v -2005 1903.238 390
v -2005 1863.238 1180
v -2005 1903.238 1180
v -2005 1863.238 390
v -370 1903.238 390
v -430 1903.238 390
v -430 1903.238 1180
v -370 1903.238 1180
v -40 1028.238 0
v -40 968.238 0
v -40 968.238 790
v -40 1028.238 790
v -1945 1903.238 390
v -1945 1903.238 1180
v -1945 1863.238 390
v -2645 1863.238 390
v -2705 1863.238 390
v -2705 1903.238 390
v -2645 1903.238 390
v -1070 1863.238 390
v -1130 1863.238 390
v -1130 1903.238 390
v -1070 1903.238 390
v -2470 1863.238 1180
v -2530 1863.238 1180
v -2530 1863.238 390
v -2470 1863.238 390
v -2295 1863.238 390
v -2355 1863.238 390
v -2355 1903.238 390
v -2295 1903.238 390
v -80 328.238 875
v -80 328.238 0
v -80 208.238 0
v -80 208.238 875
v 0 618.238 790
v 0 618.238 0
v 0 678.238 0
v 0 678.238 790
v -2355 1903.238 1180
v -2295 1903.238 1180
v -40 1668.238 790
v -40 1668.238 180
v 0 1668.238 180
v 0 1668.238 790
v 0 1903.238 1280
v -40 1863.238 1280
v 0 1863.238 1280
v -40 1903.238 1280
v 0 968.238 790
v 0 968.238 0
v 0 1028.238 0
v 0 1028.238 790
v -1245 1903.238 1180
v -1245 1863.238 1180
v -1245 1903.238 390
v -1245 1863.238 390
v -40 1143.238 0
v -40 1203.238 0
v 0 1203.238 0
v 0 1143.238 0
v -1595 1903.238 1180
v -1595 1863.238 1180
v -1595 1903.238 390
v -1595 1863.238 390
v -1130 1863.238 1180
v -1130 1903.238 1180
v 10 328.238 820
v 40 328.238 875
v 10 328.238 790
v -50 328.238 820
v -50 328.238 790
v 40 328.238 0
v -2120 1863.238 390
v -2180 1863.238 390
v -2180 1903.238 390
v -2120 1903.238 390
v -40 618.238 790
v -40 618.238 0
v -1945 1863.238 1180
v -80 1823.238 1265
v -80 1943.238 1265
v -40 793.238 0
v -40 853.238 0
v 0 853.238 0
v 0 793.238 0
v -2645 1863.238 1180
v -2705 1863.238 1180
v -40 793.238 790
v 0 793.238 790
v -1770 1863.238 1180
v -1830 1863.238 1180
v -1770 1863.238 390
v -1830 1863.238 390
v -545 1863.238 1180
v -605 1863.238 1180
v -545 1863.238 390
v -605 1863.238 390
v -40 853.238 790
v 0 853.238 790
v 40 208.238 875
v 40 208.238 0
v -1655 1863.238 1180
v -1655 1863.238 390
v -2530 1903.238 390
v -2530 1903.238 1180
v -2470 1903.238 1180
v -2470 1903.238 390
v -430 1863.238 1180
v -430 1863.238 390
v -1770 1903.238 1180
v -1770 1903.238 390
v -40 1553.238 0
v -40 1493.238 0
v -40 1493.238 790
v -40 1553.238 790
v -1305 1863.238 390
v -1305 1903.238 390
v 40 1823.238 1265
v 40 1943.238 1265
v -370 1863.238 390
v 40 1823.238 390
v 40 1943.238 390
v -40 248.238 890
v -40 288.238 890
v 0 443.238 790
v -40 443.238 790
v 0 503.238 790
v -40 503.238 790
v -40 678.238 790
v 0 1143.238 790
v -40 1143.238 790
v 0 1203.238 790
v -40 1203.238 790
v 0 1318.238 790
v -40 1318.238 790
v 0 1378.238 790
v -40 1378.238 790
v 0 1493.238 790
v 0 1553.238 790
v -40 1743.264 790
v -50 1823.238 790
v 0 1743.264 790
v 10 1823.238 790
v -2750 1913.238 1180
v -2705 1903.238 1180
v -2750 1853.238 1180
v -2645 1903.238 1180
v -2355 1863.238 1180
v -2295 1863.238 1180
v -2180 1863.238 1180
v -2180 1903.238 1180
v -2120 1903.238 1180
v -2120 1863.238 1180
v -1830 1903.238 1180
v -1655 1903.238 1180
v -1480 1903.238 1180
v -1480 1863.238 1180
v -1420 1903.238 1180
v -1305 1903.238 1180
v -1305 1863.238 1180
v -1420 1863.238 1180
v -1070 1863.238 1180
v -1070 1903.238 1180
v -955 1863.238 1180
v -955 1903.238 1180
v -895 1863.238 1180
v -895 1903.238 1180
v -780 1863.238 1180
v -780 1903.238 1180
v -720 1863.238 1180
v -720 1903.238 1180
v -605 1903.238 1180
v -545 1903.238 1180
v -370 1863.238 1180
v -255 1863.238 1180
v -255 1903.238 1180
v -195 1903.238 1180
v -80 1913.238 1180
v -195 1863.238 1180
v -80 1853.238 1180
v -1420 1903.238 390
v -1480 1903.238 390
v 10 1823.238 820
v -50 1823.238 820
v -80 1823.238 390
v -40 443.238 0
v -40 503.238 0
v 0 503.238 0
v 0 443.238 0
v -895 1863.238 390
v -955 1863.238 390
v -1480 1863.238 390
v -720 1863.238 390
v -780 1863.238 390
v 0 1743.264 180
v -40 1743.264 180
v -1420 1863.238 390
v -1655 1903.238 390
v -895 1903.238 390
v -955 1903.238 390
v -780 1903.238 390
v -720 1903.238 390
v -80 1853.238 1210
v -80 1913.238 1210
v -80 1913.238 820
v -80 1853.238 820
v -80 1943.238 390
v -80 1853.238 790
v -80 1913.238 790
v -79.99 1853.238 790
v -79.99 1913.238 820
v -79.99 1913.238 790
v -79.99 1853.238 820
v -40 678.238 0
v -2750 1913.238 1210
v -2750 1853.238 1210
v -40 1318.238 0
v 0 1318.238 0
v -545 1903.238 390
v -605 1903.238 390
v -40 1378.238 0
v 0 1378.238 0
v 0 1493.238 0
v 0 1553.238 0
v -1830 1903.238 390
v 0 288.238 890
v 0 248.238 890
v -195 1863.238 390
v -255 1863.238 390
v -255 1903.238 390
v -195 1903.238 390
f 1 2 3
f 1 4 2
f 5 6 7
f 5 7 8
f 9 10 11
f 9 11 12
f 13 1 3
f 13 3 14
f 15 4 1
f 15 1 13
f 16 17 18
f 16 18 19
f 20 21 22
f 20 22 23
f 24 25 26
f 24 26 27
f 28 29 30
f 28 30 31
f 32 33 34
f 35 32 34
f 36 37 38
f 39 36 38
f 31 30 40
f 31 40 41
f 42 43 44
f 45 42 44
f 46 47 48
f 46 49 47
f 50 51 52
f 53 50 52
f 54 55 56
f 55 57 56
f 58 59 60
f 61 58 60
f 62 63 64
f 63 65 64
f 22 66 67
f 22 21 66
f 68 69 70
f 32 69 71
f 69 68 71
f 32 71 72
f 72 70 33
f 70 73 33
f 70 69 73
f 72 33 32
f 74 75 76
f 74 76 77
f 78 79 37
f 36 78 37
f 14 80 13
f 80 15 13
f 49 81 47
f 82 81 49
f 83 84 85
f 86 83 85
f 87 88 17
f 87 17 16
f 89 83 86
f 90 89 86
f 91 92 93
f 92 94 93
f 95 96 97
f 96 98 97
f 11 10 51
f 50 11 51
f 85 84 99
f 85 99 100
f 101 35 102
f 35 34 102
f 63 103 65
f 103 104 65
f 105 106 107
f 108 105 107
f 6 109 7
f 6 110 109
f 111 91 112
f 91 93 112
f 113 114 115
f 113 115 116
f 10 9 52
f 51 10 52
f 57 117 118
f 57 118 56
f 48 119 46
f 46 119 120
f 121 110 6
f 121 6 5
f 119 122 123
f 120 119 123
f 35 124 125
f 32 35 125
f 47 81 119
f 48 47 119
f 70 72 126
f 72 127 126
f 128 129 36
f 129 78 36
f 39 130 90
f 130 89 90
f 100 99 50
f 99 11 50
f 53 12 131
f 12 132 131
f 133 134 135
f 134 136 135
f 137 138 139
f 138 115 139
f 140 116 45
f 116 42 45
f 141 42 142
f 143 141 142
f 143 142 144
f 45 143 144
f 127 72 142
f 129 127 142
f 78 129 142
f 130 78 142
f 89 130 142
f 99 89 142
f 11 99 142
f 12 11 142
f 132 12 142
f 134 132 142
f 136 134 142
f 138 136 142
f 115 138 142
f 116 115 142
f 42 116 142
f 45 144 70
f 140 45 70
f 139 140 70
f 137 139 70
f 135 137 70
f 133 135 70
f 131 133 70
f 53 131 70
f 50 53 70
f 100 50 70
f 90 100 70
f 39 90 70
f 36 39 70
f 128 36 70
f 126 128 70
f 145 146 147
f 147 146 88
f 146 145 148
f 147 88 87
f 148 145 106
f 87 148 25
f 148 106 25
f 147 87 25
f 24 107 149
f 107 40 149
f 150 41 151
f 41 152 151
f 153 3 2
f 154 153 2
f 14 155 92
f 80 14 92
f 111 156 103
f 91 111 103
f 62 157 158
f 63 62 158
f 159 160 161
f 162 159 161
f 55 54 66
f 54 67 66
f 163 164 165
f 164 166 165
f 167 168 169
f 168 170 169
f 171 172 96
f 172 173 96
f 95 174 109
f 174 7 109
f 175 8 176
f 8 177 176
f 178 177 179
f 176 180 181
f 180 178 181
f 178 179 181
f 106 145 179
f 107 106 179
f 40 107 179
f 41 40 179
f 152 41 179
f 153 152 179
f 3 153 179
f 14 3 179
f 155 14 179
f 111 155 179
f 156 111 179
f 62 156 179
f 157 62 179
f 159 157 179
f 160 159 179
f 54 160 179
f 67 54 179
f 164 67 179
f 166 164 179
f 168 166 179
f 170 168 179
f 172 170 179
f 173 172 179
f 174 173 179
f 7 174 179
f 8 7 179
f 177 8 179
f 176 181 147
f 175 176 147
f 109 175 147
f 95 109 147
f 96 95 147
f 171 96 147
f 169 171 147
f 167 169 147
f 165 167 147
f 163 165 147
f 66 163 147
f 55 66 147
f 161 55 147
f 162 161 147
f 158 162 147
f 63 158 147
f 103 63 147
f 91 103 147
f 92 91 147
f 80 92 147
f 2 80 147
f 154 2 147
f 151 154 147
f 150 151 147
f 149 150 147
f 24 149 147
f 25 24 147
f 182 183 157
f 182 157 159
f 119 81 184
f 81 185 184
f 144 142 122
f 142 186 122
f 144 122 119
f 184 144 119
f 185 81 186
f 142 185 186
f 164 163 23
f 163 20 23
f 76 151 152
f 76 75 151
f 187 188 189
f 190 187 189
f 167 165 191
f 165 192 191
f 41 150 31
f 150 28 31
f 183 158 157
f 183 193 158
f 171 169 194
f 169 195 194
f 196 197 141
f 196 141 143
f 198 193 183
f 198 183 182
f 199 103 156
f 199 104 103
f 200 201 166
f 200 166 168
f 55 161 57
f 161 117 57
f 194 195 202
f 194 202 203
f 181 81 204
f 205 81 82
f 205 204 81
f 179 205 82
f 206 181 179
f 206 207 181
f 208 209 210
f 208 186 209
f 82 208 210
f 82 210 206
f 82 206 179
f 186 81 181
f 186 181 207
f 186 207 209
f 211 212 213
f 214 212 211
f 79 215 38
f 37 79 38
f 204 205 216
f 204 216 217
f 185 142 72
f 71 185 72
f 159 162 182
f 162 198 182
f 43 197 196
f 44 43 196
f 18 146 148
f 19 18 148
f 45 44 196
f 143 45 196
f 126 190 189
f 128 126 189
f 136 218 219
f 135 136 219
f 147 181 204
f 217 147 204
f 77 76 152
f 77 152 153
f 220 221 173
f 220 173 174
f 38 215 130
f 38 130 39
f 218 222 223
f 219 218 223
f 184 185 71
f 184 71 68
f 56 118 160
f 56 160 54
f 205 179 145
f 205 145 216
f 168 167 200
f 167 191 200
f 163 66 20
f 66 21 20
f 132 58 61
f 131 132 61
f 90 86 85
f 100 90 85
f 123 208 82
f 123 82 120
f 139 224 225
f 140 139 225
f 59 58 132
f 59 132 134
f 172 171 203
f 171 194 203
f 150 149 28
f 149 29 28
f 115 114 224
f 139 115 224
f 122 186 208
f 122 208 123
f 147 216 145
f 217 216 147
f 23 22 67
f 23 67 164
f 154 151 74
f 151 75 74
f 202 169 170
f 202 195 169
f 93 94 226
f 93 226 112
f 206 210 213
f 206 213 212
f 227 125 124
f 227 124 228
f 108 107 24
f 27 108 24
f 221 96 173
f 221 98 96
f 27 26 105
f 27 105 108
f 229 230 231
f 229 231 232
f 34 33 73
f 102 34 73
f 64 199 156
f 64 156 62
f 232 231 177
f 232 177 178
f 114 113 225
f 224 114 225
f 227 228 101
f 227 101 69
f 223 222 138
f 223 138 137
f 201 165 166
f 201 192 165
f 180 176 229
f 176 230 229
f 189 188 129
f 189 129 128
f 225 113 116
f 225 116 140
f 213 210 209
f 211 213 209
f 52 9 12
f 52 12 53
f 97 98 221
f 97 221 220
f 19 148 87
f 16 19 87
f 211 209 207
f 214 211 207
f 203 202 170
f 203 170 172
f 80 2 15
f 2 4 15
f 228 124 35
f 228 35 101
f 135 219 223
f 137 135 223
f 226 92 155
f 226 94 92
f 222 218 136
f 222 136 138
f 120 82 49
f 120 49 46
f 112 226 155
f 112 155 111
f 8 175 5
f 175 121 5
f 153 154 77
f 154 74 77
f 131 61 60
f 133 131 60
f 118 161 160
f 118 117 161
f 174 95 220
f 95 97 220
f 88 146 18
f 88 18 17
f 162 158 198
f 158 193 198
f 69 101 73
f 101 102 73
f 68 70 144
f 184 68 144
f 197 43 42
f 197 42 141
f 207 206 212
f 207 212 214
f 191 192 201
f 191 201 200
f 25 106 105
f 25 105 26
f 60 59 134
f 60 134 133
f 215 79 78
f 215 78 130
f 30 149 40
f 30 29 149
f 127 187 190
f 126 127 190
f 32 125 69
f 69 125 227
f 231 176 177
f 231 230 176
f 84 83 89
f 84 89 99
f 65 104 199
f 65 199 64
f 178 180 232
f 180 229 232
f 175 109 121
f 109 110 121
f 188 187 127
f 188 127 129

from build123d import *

# Parameters (mm, degrees)
F0_W      = 60
F0_H      = 40
F1_DEPTH  = 790
F0_W_2    = 40
F0_H_2    = 75.0254201889
F0_H_3    = 60
F0_W_3    = 120
F0_H_4    = 120
F3_DEPTH  = 30
F4_W      = 120
F4_H      = 120
F5_DEPTH  = 100
F6_SIZE2  = 40
F6_SIZE   = 15
F8_W      = 2854.2961788441
F8_H      = 160
F8_W_2    = 60
F8_H_2    = 40
F9_DEPTH  = 390
F10_W     = 40
F10_H     = 75.0254201889
F11_DEPTH = 180
F12_W     = 120
F12_H     = 120
F13_DEPTH = 390
F14_SIZE2 = 15
F14_SIZE  = 40
F15_W     = 60
F15_H     = 30
F16_DEPTH = 2337.735
F17_W     = 60
F17_H     = 40
F18_DEPTH = 390
F19_W     = 60
F19_H     = 30
F20_DEPTH = 2670
F21_W     = 60
F21_H     = 40
F22_DEPTH = 790


with BuildPart() as f1:
    # F0 (on Top) → F1 (new body)
    with BuildSketch(Plane.XY):
        with Locations((-2325, 1883.2384967804)):
            Rectangle(F0_W, F0_H)
    extrude(amount=F1_DEPTH)


with BuildPart() as f1b:
    # F0 (on Top) → F1, piece 2 (new body)
    with BuildSketch(Plane.XY):
        with Locations((-2150, 1883.2384967804)):
            Rectangle(F0_W, F0_H)
    extrude(amount=F1_DEPTH)


with BuildPart() as f1c:
    # F0 (on Top) → F1, piece 3 (new body)
    with BuildSketch(Plane.XY):
        with Locations((-1975, 1883.2384967804)):
            Rectangle(F0_W, F0_H)
    extrude(amount=F1_DEPTH)


with BuildPart() as f1d:
    # F0 (on Top) → F1, piece 4 (new body)
    with BuildSketch(Plane.XY):
        with Locations((-1800, 1883.2384967804)):
            Rectangle(F0_W, F0_H)
    extrude(amount=F1_DEPTH)


with BuildPart() as f1e:
    # F0 (on Top) → F1, piece 5 (new body)
    with BuildSketch(Plane.XY):
        with Locations((-1625, 1883.2384967804)):
            Rectangle(F0_W, F0_H)
    extrude(amount=F1_DEPTH)


with BuildPart() as f1f:
    # F0 (on Top) → F1, piece 6 (new body)
    with BuildSketch(Plane.XY):
        with Locations((-1450, 1883.2384967804)):
            Rectangle(F0_W, F0_H)
    extrude(amount=F1_DEPTH)


with BuildPart() as f1g:
    # F0 (on Top) → F1, piece 7 (new body)
    with BuildSketch(Plane.XY):
        with Locations((-1275, 1883.2384967804)):
            Rectangle(F0_W, F0_H)
    extrude(amount=F1_DEPTH)


with BuildPart() as f1h:
    # F0 (on Top) → F1, piece 8 (new body)
    with BuildSketch(Plane.XY):
        with Locations((-1100, 1883.2384967804)):
            Rectangle(F0_W, F0_H)
    extrude(amount=F1_DEPTH)


with BuildPart() as f1i:
    # F0 (on Top) → F1, piece 9 (new body)
    with BuildSketch(Plane.XY):
        with Locations((-925, 1883.2384967804)):
            Rectangle(F0_W, F0_H)
    extrude(amount=F1_DEPTH)


with BuildPart() as f1j:
    # F0 (on Top) → F1, piece 10 (new body)
    with BuildSketch(Plane.XY):
        with Locations((-750, 1883.2384967804)):
            Rectangle(F0_W, F0_H)
    extrude(amount=F1_DEPTH)


with BuildPart() as f1k:
    # F0 (on Top) → F1, piece 11 (new body)
    with BuildSketch(Plane.XY):
        with Locations((-575, 1883.2384967804)):
            Rectangle(F0_W, F0_H)
    extrude(amount=F1_DEPTH)


with BuildPart() as f1l:
    # F0 (on Top) → F1, piece 12 (new body)
    with BuildSketch(Plane.XY):
        with Locations((-400, 1883.2384967804)):
            Rectangle(F0_W, F0_H)
    extrude(amount=F1_DEPTH)


with BuildPart() as f1m:
    # F0 (on Top) → F1, piece 13 (new body)
    with BuildSketch(Plane.XY):
        with Locations((-225, 1883.2384967804)):
            Rectangle(F0_W, F0_H)
    extrude(amount=F1_DEPTH)


with BuildPart() as f1n:
    # F0 (on Top) → F1, piece 14 (new body)
    with BuildSketch(Plane.XY):
        with Locations((-20, 1705.7512068748)):
            Rectangle(F0_W_2, F0_H_2)
    extrude(amount=F1_DEPTH)


with BuildPart() as f1o:
    # F0 (on Top) → F1, piece 15 (new body)
    with BuildSketch(Plane.XY):
        with Locations((-20, 1523.2384967804)):
            Rectangle(F0_W_2, F0_H_3)
    extrude(amount=F1_DEPTH)


with BuildPart() as f1p:
    # F0 (on Top) → F1, piece 16 (new body)
    with BuildSketch(Plane.XY):
        with Locations((-20, 1348.2384967804)):
            Rectangle(F0_W_2, F0_H_3)
    extrude(amount=F1_DEPTH)


with BuildPart() as f1q:
    # F0 (on Top) → F1, piece 17 (new body)
    with BuildSketch(Plane.XY):
        with Locations((-20, 1173.2384967804)):
            Rectangle(F0_W_2, F0_H_3)
    extrude(amount=F1_DEPTH)


with BuildPart() as f1r:
    # F0 (on Top) → F1, piece 18 (new body)
    with BuildSketch(Plane.XY):
        with Locations((-20, 998.2384967804)):
            Rectangle(F0_W_2, F0_H_3)
    extrude(amount=F1_DEPTH)


with BuildPart() as f1s:
    # F0 (on Top) → F1, piece 19 (new body)
    with BuildSketch(Plane.XY):
        with Locations((-20, 823.2384967804)):
            Rectangle(F0_W_2, F0_H_3)
    extrude(amount=F1_DEPTH)


with BuildPart() as f1t:
    # F0 (on Top) → F1, piece 20 (new body)
    with BuildSketch(Plane.XY):
        with Locations((-20, 648.2384967804)):
            Rectangle(F0_W_2, F0_H_3)
    extrude(amount=F1_DEPTH)


with BuildPart() as f1u:
    # F0 (on Top) → F1, piece 21 (new body)
    with BuildSketch(Plane.XY):
        with Locations((-20, 473.2384967804)):
            Rectangle(F0_W_2, F0_H_3)
    extrude(amount=F1_DEPTH)


with BuildPart() as f1v:
    # F0 (on Top) → F1, piece 22 (new body)
    with BuildSketch(Plane.XY):
        with Locations((-20, 1883.2384967804)):
            Rectangle(F0_W_3, F0_H_4)
    extrude(amount=F1_DEPTH)


with BuildPart() as f1w:
    # F0 (on Top) → F1, piece 23 (new body)
    with BuildSketch(Plane.XY):
        with Locations((-20, 268.2384967804)):
            Rectangle(F0_W_3, F0_H_4)
    extrude(amount=F1_DEPTH)


with BuildPart() as f3:
    # F2 (on face) → F3 (new body)
    with BuildSketch(Plane.XY.offset(790)):
        Polygon((-50, 328.2384967804), (-80, 328.2384967804), (-80, 208.2384967804), (40, 208.2384967804), (40, 328.2384967804), (10, 328.2384967804), align=None)
        Polygon((-50, 1853.2384967804), (-50, 328.2384967804), (10, 328.2384967804), (10, 1913.2384967804), (-2417.7248619497, 1913.2384967804), (-2417.7248619497, 1853.2384967804), align=None)
    extrude(amount=F3_DEPTH)


with BuildPart() as f5:
    # F4 (on face) → F5 (new body)
    with BuildSketch(Plane.XY.offset(790)):
        with Locations((-20, 1883.2384967804)):
            Rectangle(F4_W, F4_H)
    extrude(amount=F5_DEPTH)


with BuildPart() as f5b:
    # F4 (on face) → F5, piece 2 (new body)
    with BuildSketch(Plane.XY.offset(790)):
        with Locations((-20, 268.2384967804)):
            Rectangle(F4_W, F4_H)
    extrude(amount=F5_DEPTH)

    # F6
    f6_edges = [f5b.edges().sort_by_distance(p)[0] for p in [
        (40, 268.238497, 890),
        (-20, 208.238497, 890),
        (-80, 268.238497, 890),
        (-20, 328.238497, 890),
    ]]
    chamfer(f6_edges, length=F6_SIZE, length2=F6_SIZE2)


with BuildPart() as f1w_1:
    add(f1w.part)

    # F7: union F1v, F1u, F1t, F1s, F1r, F1q, F1p, F1o, F1n, F1m, F1l, F1k, F1j, F1i, F1h, F1g, F1f, F1e, F1d, F1c, F1b, F1, F3, F5b, F5
    add(f1v.part)
    add(f1u.part)
    add(f1t.part)
    add(f1s.part)
    add(f1r.part)
    add(f1q.part)
    add(f1p.part)
    add(f1o.part)
    add(f1n.part)
    add(f1m.part)
    add(f1l.part)
    add(f1k.part)
    add(f1j.part)
    add(f1i.part)
    add(f1h.part)
    add(f1g.part)
    add(f1f.part)
    add(f1e.part)
    add(f1d.part)
    add(f1c.part)
    add(f1b.part)
    add(f1.part)
    add(f3.part)
    add(f5b.part)
    add(f5.part)

    # F8 (on face) → F9 (cut)
    with BuildSketch(Plane(origin=(0, 0, 0), x_dir=(1, 0, 0), z_dir=(0, 0, -1))):
        with Locations((-1124.7590482235, -1868.9160346985)):
            Rectangle(F8_W, F8_H)
        with Locations((-2325, -1883.2384967804)):
            Rectangle(F8_W_2, F8_H_2, mode=Mode.SUBTRACT)
        with Locations((-2325, -1883.2384967804)):
            Rectangle(F8_W_2, F8_H_2)
    extrude(amount=-F9_DEPTH, mode=Mode.SUBTRACT)

    # F10 (on face) → F11 (cut)
    with BuildSketch(Plane(origin=(0, 0, 0), x_dir=(1, 0, 0), z_dir=(0, 0, -1))):
        with Locations((-20, -1705.7512068748)):
            Rectangle(F10_W, F10_H)
    extrude(amount=-F11_DEPTH, mode=Mode.SUBTRACT)

    # F12 (on face) → F13 (join)
    with BuildSketch(Plane.XY.offset(890)):
        with Locations((-20, 1883.2384967804)):
            Rectangle(F12_W, F12_H)
    extrude(amount=F13_DEPTH)

    # F14
    f14_edges = [f1w_1.edges().sort_by_distance(p)[0] for p in [
        (-20, 1823.238497, 1280),
        (-80, 1883.238497, 1280),
        (-20, 1943.238497, 1280),
        (40, 1883.238497, 1280),
    ]]
    f14_side = f1w_1.faces().sort_by_distance((-20, 1883.238497, 1280))[0]
    chamfer(f14_edges, length=F14_SIZE, length2=F14_SIZE2, reference=f14_side)

    # F15 (on face) → F16 (cut)
    with BuildSketch(Plane(origin=(-2417.7248619497, 0, 0), x_dir=(0, -1, 0), z_dir=(-1, 0, 0))):
        with Locations((-1883.2384967804, 805)):
            Rectangle(F15_W, F15_H)
    extrude(amount=-F16_DEPTH, mode=Mode.SUBTRACT)

    # F17 (on face) → F18 (join)
    with BuildSketch(Plane.XY.offset(790)):
        with Locations((-2325, 1883.2384967804)):
            Rectangle(F17_W, F17_H)
        with Locations((-2150, 1883.2384967804)):
            Rectangle(F17_W, F17_H)
        with Locations((-1975, 1883.2384967804)):
            Rectangle(F17_W, F17_H)
        with Locations((-1800, 1883.2384967804)):
            Rectangle(F17_W, F17_H)
        with Locations((-1625, 1883.2384967804)):
            Rectangle(F17_W, F17_H)
        with Locations((-1450, 1883.2384967804)):
            Rectangle(F17_W, F17_H)
        with Locations((-1275, 1883.2384967804)):
            Rectangle(F17_W, F17_H)
        with Locations((-1100, 1883.2384967804)):
            Rectangle(F17_W, F17_H)
        with Locations((-925, 1883.2384967804)):
            Rectangle(F17_W, F17_H)
        with Locations((-750, 1883.2384967804)):
            Rectangle(F17_W, F17_H)
        with Locations((-575, 1883.2384967804)):
            Rectangle(F17_W, F17_H)
        with Locations((-400, 1883.2384967804)):
            Rectangle(F17_W, F17_H)
        with Locations((-225, 1883.2384967804)):
            Rectangle(F17_W, F17_H)
    extrude(amount=F18_DEPTH)

    # F19 (on face) → F20 (join)
    with BuildSketch(Plane(origin=(-80, 0, 0), x_dir=(0, -1, 0), z_dir=(-1, 0, 0))):
        with Locations((-1883.2384967804, 1195)):
            Rectangle(F19_W, F19_H)
    extrude(amount=F20_DEPTH)

    # F21 (on face) → F22 (join)
    with BuildSketch(Plane(origin=(0, 0, 1180), x_dir=(1, 0, 0), z_dir=(0, 0, -1))):
        with Locations((-2675, -1883.2384967804)):
            Rectangle(F21_W, F21_H)
        with Locations((-2500, -1883.2384967804)):
            Rectangle(F21_W, F21_H)
    extrude(amount=F22_DEPTH)


solid = f1w_1.part
